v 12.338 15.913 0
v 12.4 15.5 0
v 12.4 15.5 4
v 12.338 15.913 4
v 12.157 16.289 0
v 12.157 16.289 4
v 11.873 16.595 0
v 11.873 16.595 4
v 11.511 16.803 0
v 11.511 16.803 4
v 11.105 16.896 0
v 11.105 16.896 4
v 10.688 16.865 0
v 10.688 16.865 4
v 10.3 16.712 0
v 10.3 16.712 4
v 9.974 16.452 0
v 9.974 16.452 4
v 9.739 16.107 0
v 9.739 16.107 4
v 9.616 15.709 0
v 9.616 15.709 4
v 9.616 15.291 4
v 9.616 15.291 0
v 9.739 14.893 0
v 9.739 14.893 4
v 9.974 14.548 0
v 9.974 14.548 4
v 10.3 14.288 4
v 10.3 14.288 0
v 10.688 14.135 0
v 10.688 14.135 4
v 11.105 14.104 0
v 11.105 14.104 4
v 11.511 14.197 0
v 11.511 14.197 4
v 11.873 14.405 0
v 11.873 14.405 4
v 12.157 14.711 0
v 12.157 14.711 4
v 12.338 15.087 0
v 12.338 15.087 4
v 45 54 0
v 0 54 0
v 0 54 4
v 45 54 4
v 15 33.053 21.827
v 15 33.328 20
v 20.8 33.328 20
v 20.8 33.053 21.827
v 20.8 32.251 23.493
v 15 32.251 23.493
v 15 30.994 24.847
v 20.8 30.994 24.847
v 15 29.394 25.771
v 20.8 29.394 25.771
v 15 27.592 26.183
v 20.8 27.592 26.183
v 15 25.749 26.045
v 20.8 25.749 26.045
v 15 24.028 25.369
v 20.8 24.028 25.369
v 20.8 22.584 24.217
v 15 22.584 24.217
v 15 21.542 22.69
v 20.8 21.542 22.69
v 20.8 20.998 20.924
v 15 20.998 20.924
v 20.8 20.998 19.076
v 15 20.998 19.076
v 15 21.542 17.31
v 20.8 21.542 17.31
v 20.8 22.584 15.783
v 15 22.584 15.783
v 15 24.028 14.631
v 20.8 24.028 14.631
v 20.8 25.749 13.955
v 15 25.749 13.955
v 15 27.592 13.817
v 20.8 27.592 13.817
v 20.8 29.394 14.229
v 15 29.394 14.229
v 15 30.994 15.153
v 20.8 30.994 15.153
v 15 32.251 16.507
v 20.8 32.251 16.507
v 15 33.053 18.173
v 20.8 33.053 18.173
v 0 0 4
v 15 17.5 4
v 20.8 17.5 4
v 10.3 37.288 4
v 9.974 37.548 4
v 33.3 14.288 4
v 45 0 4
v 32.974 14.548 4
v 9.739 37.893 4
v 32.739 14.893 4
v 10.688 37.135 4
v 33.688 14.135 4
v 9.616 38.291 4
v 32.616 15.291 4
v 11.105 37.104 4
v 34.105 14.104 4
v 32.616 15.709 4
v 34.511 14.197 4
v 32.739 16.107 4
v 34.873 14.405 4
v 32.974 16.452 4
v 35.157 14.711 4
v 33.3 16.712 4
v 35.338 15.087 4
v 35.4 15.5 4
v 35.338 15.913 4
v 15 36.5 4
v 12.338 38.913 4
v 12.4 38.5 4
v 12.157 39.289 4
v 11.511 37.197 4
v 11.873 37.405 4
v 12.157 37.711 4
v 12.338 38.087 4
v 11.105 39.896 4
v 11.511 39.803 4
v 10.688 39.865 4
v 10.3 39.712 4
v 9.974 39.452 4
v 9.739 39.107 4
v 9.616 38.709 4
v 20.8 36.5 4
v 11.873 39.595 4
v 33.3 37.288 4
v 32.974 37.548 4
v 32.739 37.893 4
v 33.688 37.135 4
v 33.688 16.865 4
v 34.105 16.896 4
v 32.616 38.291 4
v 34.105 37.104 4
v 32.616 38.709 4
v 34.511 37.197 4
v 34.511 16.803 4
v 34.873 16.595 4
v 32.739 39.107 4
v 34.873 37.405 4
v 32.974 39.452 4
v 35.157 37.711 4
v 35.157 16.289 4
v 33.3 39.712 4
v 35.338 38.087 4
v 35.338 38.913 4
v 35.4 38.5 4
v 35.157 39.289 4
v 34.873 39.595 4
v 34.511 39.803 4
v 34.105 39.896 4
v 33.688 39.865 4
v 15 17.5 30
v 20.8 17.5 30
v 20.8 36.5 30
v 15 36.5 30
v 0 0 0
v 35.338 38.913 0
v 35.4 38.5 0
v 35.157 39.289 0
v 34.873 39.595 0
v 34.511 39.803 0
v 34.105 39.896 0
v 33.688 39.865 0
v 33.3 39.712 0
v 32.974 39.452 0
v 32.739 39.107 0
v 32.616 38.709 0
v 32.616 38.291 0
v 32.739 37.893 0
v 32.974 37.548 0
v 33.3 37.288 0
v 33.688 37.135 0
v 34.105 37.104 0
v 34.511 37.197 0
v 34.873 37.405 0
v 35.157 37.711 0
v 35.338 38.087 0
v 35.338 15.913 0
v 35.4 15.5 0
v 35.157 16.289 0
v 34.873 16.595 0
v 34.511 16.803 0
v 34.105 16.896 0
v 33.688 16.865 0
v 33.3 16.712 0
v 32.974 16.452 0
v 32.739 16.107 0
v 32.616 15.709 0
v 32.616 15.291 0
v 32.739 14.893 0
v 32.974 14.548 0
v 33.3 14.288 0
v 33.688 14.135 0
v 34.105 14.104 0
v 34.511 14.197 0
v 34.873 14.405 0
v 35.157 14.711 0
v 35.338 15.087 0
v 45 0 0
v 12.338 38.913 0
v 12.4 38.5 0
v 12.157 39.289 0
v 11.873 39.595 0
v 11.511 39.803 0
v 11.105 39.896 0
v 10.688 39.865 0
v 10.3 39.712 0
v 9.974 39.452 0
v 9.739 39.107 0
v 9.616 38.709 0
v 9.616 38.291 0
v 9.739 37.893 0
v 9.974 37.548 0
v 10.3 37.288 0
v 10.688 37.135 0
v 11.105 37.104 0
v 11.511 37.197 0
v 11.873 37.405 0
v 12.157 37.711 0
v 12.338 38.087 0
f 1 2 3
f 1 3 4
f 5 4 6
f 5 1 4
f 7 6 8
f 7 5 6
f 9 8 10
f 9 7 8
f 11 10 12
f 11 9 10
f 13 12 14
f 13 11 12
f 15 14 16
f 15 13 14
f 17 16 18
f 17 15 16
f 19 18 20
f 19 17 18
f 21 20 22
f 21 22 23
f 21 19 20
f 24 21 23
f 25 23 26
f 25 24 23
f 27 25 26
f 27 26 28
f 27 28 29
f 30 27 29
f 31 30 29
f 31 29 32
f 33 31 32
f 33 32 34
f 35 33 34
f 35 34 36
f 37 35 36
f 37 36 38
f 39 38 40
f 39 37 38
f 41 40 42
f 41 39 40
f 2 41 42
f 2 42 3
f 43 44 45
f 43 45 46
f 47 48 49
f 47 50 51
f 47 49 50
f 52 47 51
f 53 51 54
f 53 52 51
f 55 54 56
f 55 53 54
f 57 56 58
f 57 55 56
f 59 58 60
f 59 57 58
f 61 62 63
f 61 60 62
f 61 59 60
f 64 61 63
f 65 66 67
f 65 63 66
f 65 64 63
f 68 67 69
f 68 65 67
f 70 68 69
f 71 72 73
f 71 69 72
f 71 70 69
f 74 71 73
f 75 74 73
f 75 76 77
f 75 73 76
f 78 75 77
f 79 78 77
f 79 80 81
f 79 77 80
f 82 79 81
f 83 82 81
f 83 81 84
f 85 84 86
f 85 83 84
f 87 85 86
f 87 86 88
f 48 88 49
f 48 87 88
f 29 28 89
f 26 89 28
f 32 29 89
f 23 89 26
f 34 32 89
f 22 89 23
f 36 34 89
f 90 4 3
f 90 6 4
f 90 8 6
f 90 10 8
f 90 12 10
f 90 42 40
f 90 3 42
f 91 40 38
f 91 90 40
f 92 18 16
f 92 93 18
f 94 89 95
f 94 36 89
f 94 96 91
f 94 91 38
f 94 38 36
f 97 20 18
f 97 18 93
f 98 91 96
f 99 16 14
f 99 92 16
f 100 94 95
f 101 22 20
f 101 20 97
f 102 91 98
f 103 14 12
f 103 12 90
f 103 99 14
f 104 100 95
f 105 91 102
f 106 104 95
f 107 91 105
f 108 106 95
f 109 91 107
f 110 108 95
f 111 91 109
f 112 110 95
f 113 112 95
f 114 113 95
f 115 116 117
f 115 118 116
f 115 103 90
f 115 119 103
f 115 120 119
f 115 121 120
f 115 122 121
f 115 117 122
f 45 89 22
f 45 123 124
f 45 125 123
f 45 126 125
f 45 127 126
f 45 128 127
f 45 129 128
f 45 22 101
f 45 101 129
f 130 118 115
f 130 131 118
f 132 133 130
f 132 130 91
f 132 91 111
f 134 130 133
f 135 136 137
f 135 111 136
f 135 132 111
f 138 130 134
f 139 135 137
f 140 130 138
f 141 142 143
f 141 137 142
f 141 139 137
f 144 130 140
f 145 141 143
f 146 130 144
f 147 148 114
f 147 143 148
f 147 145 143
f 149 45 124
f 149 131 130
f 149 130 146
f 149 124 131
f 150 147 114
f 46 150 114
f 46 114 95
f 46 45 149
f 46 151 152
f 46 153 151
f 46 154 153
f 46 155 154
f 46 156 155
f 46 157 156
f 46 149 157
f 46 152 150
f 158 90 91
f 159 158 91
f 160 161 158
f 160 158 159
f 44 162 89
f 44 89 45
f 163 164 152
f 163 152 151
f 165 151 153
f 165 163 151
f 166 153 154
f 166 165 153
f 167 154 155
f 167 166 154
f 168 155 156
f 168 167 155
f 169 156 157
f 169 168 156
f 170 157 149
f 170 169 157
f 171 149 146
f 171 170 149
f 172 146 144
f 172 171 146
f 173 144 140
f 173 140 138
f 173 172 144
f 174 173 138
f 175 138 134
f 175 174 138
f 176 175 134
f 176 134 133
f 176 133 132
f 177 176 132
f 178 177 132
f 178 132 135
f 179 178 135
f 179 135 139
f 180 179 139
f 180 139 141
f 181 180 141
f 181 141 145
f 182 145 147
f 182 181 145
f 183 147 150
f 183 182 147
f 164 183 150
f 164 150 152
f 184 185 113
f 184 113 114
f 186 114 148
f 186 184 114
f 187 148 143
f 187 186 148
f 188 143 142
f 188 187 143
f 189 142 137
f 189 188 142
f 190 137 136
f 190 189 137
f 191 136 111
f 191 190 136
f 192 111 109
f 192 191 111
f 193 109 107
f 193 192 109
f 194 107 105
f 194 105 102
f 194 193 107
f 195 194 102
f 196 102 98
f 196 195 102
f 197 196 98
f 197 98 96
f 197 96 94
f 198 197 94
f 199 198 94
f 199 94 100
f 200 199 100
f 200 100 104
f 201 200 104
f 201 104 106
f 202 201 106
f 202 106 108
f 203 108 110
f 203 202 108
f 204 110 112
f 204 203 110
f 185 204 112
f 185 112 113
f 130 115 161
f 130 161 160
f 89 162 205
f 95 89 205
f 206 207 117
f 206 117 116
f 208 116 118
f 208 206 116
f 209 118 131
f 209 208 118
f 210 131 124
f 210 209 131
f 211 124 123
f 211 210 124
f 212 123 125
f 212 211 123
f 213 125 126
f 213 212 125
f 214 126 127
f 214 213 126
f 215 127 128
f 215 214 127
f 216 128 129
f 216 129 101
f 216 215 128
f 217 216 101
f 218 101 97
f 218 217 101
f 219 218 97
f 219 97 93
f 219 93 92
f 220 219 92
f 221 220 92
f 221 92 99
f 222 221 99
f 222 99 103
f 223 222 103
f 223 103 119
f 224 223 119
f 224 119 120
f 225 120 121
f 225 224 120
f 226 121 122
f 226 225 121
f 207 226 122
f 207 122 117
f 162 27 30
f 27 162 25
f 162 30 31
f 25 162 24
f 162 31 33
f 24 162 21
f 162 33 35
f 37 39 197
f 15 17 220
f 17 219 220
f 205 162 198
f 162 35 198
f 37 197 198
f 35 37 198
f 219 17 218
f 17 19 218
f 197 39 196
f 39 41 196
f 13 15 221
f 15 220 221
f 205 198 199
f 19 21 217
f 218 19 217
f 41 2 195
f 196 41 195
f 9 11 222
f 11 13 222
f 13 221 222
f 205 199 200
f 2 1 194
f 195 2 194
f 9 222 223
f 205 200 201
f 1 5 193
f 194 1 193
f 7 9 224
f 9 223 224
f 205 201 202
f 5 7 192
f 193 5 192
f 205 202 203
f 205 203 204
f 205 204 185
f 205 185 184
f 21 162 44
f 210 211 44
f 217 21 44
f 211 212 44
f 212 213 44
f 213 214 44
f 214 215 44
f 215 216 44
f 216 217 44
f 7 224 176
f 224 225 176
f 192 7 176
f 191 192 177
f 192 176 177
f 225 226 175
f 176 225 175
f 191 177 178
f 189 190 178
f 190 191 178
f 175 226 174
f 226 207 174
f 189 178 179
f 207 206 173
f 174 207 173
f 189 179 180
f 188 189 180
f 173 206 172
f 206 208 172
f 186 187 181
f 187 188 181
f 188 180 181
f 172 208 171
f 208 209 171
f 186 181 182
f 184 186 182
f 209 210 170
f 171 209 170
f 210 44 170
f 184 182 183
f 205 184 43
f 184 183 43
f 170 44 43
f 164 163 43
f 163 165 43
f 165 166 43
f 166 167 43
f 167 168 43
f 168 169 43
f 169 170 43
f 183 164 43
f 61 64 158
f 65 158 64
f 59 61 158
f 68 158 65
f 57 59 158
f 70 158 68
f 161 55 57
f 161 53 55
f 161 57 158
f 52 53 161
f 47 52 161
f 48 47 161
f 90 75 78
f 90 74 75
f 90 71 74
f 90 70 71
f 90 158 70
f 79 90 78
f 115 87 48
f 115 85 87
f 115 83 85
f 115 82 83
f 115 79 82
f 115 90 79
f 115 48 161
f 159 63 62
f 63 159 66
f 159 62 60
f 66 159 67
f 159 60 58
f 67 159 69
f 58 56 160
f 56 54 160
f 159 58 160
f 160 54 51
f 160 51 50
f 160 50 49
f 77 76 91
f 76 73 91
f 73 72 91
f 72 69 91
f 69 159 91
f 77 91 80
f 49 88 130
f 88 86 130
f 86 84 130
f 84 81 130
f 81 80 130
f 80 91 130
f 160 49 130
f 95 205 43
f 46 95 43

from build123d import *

# Parameters (mm, degrees)
F0_W     = 45
F0_H     = 54
F0_R     = 1.4
F0_W_2   = 5.8
F0_H_2   = 19
F1_DEPTH = 4
F2_DEPTH = 30
F3_R     = 6.2
F4_DEPTH = 25


with BuildPart() as f1:
    # F0 (on Top) → F1 (new body)
    with BuildSketch(Plane.XY):
        with Locations((22.5, 27)):
            Rectangle(F0_W, F0_H)
        with Locations((11, 15.5)):
            Circle(F0_R, mode=Mode.SUBTRACT)
        with Locations((34, 15.5)):
            Circle(F0_R, mode=Mode.SUBTRACT)
        with Locations((11, 38.5)):
            Circle(F0_R, mode=Mode.SUBTRACT)
        with Locations((17.9, 27)):
            Rectangle(F0_W_2, F0_H_2, mode=Mode.SUBTRACT)
        with Locations((34, 38.5)):
            Circle(F0_R, mode=Mode.SUBTRACT)
    extrude(amount=F1_DEPTH)

    # F0 (on Top) → F2 (join)
    with BuildSketch(Plane.XY):
        with Locations((17.9, 27)):
            Rectangle(F0_W_2, F0_H_2)
    extrude(amount=F2_DEPTH)

    # F3 (on Right) → F4 (cut)
    with BuildSketch(Plane.YZ):
        with Locations((27.128499, 20)):
            Circle(F3_R)
    extrude(amount=F4_DEPTH, mode=Mode.SUBTRACT)


solid = f1.part
